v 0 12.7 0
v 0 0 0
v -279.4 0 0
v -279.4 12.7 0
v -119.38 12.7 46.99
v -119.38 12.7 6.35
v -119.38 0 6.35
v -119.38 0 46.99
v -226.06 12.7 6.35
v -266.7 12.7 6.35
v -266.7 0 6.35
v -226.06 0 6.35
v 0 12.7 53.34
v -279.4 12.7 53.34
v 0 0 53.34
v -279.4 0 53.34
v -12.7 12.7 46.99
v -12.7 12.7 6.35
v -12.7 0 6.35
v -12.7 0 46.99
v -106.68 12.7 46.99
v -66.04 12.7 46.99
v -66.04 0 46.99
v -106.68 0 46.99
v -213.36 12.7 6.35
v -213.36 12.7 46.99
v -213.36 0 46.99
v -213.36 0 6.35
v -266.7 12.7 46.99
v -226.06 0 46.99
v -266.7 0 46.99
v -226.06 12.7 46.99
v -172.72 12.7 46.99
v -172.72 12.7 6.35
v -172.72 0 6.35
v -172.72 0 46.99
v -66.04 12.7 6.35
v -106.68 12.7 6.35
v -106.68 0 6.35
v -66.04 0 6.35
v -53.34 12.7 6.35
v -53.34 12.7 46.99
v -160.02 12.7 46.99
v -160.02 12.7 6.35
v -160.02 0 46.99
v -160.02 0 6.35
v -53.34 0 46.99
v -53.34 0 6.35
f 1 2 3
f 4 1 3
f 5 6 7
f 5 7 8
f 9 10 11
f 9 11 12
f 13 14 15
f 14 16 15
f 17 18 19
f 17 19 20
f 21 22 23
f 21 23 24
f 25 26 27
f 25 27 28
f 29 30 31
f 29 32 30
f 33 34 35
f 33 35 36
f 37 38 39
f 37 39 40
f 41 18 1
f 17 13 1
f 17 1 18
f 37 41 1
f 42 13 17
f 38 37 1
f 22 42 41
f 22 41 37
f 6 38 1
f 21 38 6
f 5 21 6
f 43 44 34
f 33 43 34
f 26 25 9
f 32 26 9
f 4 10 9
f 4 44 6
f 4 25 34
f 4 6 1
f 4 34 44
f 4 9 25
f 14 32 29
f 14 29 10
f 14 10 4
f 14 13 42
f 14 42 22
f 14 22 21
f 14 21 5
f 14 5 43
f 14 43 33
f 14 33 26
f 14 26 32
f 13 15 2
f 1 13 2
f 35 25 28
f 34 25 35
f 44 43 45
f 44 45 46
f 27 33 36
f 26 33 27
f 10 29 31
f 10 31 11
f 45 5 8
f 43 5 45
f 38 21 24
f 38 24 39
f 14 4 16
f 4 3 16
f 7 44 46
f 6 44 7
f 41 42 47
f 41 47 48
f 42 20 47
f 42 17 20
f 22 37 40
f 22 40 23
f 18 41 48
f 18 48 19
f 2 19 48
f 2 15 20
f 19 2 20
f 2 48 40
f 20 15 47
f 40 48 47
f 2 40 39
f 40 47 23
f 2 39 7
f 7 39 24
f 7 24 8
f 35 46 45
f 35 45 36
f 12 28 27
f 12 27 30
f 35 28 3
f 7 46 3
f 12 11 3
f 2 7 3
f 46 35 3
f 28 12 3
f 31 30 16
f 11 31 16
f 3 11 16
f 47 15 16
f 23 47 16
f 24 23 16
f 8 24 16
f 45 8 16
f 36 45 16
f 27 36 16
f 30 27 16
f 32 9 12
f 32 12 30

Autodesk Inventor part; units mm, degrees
ref_plane "YZ Plane" through (0, 0, 0) normal (1, 0, 0) x (0, 1, 0)
ref_plane "XZ Plane" through (0, 0, 0) normal (0, 1, 0) x (-1, 0, 0)
ref_plane "XY Plane" through (0, 0, 0) normal (0, 0, 1) x (1, 0, 0)
sketch "Sketch1" plane through (0, 0, 0) normal (0, 1, 0) x (-1, 0, 0)
  line L0 (0, 0) -> (279.4, 0)
  line L1 (279.4, 0) -> (279.4, 53.34)
  line L2 (279.4, 53.34) -> (0, 53.34)
  line L3 (0, 53.34) -> (0, 0)
extrude "Extrusion1" add sketch "Sketch1" along normal blind 12.7
sketch "Sketch2" plane through (0, 12.7, 0) normal (0, 1, 0) x (1, 0, 0)
  line L0 (-12.7, -46.99) -> (-53.34, -46.99)
  line L1 (-53.34, -46.99) -> (-53.34, -6.35)
  line L2 (-53.34, -6.35) -> (-12.7, -6.35)
  line L3 (-12.7, -6.35) -> (-12.7, -46.99)
  line L4 (-279.4, -53.34) -> (0, -53.34) projected
  line L5 (0, -53.34) -> (0, 0) projected
  line L6 (-66.04, -46.99) -> (-106.68, -46.99)
  line L7 (-106.68, -46.99) -> (-106.68, -6.35)
  line L8 (-106.68, -6.35) -> (-66.04, -6.35)
  line L9 (-66.04, -6.35) -> (-66.04, -46.99)
  line L10 (-119.38, -46.99) -> (-160.02, -46.99)
  line L11 (-160.02, -46.99) -> (-160.02, -6.35)
  line L12 (-160.02, -6.35) -> (-119.38, -6.35)
  line L13 (-119.38, -6.35) -> (-119.38, -46.99)
  line L14 (-172.72, -46.99) -> (-213.36, -46.99)
  line L15 (-213.36, -46.99) -> (-213.36, -6.35)
  line L16 (-213.36, -6.35) -> (-172.72, -6.35)
  line L17 (-172.72, -6.35) -> (-172.72, -46.99)
  line L18 (-226.06, -46.99) -> (-266.7, -46.99)
  line L19 (-266.7, -46.99) -> (-266.7, -6.35)
  line L20 (-266.7, -6.35) -> (-226.06, -6.35)
  line L21 (-226.06, -6.35) -> (-226.06, -46.99)
  dimension "d2" = 40.64
  dimension "d3" = 40.64
  dimension "d4" = 6.35
  dimension "d5" = 12.7
  dimension "d6" = 40.64
  dimension "d7" = 12.7
  dimension "d8" = 40.64
  dimension "d9" = 12.7
  dimension "d10" = 40.64
  dimension "d11" = 12.7
  dimension "d12" = 40.64
  dimension "d13" = 12.7
extrude "Extrusion2" cut sketch "Sketch2" against normal through all
properties part number "Slide"
